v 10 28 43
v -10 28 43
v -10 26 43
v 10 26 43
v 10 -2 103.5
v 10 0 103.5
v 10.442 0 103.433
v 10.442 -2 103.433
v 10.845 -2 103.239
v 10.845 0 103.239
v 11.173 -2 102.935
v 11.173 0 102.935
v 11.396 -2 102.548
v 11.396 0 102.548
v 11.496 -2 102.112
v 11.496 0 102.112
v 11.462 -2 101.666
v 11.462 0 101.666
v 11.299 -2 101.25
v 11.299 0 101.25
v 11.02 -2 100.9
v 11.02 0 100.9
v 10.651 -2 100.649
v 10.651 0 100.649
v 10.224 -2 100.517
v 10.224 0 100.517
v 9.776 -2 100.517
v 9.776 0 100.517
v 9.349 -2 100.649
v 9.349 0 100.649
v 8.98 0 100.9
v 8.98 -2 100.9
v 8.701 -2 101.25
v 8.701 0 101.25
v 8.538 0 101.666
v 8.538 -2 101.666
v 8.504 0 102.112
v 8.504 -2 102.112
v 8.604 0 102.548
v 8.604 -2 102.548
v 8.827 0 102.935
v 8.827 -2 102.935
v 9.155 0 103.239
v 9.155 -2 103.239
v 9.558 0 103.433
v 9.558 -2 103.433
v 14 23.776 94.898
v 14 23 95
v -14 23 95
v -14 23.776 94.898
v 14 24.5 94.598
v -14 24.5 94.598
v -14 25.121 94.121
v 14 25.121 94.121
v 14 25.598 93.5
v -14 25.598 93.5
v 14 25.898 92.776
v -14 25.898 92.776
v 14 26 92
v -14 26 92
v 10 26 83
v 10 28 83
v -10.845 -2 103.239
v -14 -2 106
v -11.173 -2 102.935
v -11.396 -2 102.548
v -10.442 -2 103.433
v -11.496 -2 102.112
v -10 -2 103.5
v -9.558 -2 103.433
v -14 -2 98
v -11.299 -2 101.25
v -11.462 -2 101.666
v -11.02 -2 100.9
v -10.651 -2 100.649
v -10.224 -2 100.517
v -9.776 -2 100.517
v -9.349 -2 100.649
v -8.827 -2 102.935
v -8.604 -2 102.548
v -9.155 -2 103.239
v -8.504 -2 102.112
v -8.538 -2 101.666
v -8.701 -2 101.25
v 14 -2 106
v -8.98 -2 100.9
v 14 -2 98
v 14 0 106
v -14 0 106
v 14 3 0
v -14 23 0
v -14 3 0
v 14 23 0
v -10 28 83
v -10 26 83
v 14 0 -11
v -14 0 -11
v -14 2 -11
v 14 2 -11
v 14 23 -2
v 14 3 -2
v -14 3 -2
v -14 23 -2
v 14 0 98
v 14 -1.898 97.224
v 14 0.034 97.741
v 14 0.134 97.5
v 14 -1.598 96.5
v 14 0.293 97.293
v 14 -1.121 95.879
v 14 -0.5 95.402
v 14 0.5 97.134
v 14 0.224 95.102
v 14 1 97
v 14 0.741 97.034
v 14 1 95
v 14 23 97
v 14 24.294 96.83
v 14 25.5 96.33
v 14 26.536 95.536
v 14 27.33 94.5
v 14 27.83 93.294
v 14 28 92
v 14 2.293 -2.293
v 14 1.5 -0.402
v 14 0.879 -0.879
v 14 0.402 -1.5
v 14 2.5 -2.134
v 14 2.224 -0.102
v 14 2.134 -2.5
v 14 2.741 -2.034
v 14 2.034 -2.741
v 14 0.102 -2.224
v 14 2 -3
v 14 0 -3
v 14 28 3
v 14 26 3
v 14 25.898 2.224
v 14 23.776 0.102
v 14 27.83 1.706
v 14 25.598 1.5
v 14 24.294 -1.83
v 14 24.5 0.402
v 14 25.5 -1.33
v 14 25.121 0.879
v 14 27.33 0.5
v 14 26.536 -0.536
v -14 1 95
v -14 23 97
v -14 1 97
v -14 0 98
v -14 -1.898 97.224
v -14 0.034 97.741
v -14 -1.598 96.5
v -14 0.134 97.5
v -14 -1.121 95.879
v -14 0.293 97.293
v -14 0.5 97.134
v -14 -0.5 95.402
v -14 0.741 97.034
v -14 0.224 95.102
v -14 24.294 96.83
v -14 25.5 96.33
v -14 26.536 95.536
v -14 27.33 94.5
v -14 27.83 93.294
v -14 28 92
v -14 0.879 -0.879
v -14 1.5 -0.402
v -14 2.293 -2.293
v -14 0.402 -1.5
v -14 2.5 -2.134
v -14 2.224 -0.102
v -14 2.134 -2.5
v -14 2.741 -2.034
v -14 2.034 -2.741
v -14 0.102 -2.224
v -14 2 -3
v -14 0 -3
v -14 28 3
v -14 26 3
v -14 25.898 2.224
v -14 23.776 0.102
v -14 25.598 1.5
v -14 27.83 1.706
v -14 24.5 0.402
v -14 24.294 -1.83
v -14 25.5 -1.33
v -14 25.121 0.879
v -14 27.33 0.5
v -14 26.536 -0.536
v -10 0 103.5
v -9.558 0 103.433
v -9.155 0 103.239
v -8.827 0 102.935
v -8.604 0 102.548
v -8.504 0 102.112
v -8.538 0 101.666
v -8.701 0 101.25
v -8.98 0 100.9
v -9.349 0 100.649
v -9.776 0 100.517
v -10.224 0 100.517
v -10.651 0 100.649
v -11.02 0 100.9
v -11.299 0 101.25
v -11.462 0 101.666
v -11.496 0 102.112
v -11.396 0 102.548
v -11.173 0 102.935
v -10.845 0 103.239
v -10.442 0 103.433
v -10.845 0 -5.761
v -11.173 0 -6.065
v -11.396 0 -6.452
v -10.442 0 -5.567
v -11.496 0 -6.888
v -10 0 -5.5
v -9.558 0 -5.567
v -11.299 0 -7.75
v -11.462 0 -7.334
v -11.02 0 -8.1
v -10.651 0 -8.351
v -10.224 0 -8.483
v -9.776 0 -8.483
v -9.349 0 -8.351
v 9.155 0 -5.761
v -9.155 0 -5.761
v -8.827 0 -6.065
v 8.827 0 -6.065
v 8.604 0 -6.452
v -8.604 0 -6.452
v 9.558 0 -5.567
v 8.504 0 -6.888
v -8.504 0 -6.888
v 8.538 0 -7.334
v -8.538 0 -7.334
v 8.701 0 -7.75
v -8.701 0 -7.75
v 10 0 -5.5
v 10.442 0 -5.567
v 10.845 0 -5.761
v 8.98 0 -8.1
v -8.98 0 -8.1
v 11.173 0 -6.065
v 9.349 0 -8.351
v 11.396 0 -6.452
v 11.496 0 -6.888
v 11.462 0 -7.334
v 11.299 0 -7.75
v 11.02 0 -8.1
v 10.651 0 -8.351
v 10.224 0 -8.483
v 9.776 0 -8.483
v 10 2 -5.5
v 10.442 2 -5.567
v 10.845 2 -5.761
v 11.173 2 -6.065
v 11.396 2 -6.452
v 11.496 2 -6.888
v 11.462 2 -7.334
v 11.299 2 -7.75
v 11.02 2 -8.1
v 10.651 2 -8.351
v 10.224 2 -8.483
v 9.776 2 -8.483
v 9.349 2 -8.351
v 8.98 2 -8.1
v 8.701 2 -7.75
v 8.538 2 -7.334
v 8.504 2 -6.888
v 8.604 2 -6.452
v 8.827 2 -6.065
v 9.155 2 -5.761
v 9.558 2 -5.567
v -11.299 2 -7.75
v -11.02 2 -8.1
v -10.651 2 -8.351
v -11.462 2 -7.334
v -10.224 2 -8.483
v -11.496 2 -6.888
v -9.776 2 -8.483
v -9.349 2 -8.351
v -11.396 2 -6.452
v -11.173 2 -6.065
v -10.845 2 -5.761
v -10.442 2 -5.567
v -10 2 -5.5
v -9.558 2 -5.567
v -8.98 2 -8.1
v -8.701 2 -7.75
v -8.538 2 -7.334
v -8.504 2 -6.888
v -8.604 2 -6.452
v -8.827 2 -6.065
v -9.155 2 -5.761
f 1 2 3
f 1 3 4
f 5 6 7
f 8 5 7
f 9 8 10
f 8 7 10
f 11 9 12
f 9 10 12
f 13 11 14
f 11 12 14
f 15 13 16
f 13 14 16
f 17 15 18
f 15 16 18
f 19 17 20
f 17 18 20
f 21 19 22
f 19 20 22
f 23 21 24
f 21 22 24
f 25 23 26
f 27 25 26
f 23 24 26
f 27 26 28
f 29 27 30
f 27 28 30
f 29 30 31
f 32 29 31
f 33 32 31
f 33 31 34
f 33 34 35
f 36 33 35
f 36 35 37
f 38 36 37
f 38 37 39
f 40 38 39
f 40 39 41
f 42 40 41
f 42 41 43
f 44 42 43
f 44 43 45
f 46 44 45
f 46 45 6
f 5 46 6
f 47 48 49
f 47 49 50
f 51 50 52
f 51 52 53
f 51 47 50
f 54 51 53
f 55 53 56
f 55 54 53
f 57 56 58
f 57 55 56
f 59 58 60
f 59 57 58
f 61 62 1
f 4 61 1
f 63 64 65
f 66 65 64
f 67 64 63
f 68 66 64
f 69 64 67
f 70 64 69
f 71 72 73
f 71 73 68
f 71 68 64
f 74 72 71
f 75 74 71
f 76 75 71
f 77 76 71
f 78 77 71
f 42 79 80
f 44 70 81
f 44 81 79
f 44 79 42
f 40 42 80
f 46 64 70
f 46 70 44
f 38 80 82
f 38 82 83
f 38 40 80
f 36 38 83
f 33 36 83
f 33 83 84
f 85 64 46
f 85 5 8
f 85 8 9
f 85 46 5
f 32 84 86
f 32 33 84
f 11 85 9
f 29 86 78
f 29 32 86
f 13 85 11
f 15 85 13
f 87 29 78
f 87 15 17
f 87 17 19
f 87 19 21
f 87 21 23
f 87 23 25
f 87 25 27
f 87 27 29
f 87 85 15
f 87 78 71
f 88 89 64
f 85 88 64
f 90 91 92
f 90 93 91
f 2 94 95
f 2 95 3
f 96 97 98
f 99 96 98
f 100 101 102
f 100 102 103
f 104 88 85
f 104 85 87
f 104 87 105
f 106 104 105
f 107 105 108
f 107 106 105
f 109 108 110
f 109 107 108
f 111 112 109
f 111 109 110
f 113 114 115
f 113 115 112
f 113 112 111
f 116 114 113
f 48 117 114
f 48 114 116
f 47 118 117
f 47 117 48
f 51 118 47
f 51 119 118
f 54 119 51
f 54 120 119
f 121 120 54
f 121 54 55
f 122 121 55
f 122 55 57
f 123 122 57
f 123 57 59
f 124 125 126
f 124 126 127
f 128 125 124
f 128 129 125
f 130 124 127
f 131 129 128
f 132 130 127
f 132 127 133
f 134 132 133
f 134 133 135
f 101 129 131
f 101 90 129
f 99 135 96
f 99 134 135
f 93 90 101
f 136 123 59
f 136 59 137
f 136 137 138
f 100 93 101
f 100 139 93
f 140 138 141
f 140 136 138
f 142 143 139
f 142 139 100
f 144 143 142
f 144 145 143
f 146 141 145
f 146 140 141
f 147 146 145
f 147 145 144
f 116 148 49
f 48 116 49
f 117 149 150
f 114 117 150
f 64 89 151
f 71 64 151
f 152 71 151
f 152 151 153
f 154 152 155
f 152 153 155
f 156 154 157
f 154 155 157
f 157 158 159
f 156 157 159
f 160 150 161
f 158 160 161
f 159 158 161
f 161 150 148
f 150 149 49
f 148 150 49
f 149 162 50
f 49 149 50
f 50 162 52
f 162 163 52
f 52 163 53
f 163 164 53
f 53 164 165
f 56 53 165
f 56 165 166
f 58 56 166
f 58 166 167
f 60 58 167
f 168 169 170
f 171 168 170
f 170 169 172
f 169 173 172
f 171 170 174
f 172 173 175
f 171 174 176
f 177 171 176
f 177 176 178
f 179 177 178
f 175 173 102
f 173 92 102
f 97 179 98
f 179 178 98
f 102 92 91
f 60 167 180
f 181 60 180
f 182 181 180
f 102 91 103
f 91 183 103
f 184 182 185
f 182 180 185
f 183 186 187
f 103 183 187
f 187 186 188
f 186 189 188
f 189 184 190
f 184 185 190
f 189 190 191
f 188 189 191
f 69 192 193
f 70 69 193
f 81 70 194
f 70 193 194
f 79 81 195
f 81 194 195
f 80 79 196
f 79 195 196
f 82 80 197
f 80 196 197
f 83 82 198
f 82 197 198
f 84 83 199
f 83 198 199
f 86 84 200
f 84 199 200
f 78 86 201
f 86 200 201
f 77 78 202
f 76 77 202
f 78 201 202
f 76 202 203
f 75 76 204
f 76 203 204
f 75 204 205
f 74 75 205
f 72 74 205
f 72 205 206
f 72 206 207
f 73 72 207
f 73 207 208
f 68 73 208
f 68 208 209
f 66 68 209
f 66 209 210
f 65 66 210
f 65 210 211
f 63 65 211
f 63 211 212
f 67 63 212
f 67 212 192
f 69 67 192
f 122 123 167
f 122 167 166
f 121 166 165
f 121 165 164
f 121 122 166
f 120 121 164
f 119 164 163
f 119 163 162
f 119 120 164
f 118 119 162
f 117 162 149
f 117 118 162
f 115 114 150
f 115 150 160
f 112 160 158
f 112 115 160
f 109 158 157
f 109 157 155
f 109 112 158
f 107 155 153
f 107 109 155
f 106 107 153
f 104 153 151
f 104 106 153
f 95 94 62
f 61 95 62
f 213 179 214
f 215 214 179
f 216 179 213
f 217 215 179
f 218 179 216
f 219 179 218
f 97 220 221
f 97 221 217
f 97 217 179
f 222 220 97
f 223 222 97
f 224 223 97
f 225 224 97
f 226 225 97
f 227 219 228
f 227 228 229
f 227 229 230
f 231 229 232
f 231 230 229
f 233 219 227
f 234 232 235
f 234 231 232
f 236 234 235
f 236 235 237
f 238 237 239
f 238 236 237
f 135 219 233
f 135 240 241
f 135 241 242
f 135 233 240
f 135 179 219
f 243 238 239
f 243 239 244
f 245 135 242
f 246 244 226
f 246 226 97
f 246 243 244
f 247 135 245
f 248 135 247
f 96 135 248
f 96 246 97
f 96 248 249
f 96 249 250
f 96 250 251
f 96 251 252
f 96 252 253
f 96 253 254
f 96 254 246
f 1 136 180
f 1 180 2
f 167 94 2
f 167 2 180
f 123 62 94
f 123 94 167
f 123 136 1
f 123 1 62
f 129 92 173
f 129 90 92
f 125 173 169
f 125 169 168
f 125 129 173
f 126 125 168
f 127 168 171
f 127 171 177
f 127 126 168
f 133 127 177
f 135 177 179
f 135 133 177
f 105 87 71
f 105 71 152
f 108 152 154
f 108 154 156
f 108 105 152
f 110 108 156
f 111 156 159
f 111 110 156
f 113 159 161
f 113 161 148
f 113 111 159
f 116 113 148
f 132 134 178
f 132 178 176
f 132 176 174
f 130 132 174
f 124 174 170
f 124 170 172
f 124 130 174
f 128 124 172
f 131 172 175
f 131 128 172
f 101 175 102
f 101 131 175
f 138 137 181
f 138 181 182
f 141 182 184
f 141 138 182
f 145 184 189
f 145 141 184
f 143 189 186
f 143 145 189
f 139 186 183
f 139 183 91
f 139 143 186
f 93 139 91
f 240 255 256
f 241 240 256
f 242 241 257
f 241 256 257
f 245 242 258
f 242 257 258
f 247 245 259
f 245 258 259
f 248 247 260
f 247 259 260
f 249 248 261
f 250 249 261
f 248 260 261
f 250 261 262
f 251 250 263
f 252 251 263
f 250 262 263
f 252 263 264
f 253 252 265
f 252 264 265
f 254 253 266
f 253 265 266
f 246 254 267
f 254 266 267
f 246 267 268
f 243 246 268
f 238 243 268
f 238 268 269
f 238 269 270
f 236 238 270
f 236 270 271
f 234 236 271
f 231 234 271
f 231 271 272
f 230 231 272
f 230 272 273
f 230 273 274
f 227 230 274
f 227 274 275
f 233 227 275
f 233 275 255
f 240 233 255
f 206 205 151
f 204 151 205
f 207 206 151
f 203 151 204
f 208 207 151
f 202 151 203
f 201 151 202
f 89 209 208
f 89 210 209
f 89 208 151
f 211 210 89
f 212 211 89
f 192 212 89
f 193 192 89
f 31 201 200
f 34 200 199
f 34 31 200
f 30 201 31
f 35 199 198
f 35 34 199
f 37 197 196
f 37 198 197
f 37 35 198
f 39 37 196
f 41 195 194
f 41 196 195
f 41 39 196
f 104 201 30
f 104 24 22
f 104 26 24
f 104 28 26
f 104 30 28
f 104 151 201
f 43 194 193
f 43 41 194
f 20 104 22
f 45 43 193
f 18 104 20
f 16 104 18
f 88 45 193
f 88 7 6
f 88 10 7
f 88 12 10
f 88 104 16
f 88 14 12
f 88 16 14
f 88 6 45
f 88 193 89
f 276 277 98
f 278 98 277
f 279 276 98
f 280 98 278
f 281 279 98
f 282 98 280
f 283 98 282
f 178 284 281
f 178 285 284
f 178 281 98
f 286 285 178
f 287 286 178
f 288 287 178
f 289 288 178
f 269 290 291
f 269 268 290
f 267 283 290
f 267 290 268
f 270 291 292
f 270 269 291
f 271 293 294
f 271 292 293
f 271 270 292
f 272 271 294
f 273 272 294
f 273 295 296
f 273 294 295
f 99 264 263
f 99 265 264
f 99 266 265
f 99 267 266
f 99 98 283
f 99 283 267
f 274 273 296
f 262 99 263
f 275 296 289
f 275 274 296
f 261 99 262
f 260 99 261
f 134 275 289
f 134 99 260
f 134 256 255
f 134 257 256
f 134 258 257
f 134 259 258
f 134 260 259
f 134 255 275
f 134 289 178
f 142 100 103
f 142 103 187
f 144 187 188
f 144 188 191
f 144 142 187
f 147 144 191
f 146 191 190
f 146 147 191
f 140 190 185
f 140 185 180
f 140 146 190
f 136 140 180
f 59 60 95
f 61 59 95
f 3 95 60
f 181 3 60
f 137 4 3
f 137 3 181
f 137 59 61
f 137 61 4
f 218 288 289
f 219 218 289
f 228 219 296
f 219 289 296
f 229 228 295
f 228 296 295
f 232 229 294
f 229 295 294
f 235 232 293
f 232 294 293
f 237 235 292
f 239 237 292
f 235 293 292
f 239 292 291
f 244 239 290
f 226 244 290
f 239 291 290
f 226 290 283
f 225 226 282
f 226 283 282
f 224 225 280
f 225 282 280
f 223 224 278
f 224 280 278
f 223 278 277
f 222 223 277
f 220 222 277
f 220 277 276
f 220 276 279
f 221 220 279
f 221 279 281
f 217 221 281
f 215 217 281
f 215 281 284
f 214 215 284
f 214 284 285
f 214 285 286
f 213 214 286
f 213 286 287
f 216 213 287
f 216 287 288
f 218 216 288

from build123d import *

# Parameters (mm, degrees)
BOSS_EXTRUDE1_DEPTH = 14
SKETCH2_W           = 20
SKETCH2_H           = 40
CUT_EXTRUDE1_DEPTH  = 112.049538495
SKETCH3_R           = 1.5
CUT_EXTRUDE2_DEPTH  = 111.526015037
SKETCH4_R           = 1.5
CUT_EXTRUDE3_DEPTH  = 111.036357628


with BuildPart() as part:
    # Sketch1 → Boss-Extrude1 (new, symmetric)
    with BuildSketch(Plane(origin=(0, 0, 0), x_dir=(0, 0, -1), z_dir=(1, 0, 0))):
        with BuildLine():
            Line((3, 0), (11, 0))
            Line((11, 0), (11, 2))
            Line((11, 2), (3, 2))
            ThreePointArc((3, 2), (2.292893219, 2.292893219), (2, 3))
            Line((2, 3), (2, 23))
            ThreePointArc((2, 23), (0.535533906, 26.535533906), (-3, 28))
            Line((-3, 28), (-92, 28))
            ThreePointArc((-92, 28), (-95.535533906, 26.535533906), (-97, 23))
            Line((-97, 23), (-97, 1))
            ThreePointArc((-97, 1), (-97.292893219, 0.292893219), (-98, 0))
            Line((-98, 0), (-106, 0))
            Line((-106, 0), (-106, -2))
            Line((-106, -2), (-98, -2))
            ThreePointArc((-98, -2), (-95.878679656, -1.121320344), (-95, 1))
            Line((-95, 1), (-95, 23))
            ThreePointArc((-95, 23), (-94.121320344, 25.121320344), (-92, 26))
            Line((-92, 26), (-3, 26))
            ThreePointArc((-3, 26), (-0.878679656, 25.121320344), (0, 23))
            Line((0, 23), (0, 3))
            ThreePointArc((0, 3), (0.878679656, 0.878679656), (3, 0))
        make_face()
    extrude(amount=BOSS_EXTRUDE1_DEPTH, both=True)

    # Sketch2 → Cut-Extrude1 (cut, through all)
    with BuildSketch(Plane(origin=(0, 28, 0), x_dir=(1, 0, 0), z_dir=(0, 1, 0))):
        with Locations((0, -63)):
            Rectangle(SKETCH2_W, SKETCH2_H)
    extrude(amount=-CUT_EXTRUDE1_DEPTH, mode=Mode.SUBTRACT)

    # Sketch3 → Cut-Extrude2 (cut, through all)
    with BuildSketch(Plane(origin=(0, 0, 0), x_dir=(1, 0, 0), z_dir=(0, 1, 0))):
        with Locations(Location((10, -102, 0), (0, 0, 270))):
            Circle(SKETCH3_R)
        with Locations(Location((-10, -102, 0), (0, 0, 270))):
            Circle(SKETCH3_R)
    extrude(amount=-CUT_EXTRUDE2_DEPTH, mode=Mode.SUBTRACT)

    # Sketch4 → Cut-Extrude3 (cut, through all)
    with BuildSketch(Plane(origin=(0, 2, 0), x_dir=(1, 0, 0), z_dir=(0, 1, 0))):
        with Locations(Location((10, 7, 0), (0, 0, 270))):
            Circle(SKETCH4_R)
        with Locations(Location((-10, 7, 0), (0, 0, 270))):
            Circle(SKETCH4_R)
    extrude(amount=-CUT_EXTRUDE3_DEPTH, mode=Mode.SUBTRACT)


solid = part.part
